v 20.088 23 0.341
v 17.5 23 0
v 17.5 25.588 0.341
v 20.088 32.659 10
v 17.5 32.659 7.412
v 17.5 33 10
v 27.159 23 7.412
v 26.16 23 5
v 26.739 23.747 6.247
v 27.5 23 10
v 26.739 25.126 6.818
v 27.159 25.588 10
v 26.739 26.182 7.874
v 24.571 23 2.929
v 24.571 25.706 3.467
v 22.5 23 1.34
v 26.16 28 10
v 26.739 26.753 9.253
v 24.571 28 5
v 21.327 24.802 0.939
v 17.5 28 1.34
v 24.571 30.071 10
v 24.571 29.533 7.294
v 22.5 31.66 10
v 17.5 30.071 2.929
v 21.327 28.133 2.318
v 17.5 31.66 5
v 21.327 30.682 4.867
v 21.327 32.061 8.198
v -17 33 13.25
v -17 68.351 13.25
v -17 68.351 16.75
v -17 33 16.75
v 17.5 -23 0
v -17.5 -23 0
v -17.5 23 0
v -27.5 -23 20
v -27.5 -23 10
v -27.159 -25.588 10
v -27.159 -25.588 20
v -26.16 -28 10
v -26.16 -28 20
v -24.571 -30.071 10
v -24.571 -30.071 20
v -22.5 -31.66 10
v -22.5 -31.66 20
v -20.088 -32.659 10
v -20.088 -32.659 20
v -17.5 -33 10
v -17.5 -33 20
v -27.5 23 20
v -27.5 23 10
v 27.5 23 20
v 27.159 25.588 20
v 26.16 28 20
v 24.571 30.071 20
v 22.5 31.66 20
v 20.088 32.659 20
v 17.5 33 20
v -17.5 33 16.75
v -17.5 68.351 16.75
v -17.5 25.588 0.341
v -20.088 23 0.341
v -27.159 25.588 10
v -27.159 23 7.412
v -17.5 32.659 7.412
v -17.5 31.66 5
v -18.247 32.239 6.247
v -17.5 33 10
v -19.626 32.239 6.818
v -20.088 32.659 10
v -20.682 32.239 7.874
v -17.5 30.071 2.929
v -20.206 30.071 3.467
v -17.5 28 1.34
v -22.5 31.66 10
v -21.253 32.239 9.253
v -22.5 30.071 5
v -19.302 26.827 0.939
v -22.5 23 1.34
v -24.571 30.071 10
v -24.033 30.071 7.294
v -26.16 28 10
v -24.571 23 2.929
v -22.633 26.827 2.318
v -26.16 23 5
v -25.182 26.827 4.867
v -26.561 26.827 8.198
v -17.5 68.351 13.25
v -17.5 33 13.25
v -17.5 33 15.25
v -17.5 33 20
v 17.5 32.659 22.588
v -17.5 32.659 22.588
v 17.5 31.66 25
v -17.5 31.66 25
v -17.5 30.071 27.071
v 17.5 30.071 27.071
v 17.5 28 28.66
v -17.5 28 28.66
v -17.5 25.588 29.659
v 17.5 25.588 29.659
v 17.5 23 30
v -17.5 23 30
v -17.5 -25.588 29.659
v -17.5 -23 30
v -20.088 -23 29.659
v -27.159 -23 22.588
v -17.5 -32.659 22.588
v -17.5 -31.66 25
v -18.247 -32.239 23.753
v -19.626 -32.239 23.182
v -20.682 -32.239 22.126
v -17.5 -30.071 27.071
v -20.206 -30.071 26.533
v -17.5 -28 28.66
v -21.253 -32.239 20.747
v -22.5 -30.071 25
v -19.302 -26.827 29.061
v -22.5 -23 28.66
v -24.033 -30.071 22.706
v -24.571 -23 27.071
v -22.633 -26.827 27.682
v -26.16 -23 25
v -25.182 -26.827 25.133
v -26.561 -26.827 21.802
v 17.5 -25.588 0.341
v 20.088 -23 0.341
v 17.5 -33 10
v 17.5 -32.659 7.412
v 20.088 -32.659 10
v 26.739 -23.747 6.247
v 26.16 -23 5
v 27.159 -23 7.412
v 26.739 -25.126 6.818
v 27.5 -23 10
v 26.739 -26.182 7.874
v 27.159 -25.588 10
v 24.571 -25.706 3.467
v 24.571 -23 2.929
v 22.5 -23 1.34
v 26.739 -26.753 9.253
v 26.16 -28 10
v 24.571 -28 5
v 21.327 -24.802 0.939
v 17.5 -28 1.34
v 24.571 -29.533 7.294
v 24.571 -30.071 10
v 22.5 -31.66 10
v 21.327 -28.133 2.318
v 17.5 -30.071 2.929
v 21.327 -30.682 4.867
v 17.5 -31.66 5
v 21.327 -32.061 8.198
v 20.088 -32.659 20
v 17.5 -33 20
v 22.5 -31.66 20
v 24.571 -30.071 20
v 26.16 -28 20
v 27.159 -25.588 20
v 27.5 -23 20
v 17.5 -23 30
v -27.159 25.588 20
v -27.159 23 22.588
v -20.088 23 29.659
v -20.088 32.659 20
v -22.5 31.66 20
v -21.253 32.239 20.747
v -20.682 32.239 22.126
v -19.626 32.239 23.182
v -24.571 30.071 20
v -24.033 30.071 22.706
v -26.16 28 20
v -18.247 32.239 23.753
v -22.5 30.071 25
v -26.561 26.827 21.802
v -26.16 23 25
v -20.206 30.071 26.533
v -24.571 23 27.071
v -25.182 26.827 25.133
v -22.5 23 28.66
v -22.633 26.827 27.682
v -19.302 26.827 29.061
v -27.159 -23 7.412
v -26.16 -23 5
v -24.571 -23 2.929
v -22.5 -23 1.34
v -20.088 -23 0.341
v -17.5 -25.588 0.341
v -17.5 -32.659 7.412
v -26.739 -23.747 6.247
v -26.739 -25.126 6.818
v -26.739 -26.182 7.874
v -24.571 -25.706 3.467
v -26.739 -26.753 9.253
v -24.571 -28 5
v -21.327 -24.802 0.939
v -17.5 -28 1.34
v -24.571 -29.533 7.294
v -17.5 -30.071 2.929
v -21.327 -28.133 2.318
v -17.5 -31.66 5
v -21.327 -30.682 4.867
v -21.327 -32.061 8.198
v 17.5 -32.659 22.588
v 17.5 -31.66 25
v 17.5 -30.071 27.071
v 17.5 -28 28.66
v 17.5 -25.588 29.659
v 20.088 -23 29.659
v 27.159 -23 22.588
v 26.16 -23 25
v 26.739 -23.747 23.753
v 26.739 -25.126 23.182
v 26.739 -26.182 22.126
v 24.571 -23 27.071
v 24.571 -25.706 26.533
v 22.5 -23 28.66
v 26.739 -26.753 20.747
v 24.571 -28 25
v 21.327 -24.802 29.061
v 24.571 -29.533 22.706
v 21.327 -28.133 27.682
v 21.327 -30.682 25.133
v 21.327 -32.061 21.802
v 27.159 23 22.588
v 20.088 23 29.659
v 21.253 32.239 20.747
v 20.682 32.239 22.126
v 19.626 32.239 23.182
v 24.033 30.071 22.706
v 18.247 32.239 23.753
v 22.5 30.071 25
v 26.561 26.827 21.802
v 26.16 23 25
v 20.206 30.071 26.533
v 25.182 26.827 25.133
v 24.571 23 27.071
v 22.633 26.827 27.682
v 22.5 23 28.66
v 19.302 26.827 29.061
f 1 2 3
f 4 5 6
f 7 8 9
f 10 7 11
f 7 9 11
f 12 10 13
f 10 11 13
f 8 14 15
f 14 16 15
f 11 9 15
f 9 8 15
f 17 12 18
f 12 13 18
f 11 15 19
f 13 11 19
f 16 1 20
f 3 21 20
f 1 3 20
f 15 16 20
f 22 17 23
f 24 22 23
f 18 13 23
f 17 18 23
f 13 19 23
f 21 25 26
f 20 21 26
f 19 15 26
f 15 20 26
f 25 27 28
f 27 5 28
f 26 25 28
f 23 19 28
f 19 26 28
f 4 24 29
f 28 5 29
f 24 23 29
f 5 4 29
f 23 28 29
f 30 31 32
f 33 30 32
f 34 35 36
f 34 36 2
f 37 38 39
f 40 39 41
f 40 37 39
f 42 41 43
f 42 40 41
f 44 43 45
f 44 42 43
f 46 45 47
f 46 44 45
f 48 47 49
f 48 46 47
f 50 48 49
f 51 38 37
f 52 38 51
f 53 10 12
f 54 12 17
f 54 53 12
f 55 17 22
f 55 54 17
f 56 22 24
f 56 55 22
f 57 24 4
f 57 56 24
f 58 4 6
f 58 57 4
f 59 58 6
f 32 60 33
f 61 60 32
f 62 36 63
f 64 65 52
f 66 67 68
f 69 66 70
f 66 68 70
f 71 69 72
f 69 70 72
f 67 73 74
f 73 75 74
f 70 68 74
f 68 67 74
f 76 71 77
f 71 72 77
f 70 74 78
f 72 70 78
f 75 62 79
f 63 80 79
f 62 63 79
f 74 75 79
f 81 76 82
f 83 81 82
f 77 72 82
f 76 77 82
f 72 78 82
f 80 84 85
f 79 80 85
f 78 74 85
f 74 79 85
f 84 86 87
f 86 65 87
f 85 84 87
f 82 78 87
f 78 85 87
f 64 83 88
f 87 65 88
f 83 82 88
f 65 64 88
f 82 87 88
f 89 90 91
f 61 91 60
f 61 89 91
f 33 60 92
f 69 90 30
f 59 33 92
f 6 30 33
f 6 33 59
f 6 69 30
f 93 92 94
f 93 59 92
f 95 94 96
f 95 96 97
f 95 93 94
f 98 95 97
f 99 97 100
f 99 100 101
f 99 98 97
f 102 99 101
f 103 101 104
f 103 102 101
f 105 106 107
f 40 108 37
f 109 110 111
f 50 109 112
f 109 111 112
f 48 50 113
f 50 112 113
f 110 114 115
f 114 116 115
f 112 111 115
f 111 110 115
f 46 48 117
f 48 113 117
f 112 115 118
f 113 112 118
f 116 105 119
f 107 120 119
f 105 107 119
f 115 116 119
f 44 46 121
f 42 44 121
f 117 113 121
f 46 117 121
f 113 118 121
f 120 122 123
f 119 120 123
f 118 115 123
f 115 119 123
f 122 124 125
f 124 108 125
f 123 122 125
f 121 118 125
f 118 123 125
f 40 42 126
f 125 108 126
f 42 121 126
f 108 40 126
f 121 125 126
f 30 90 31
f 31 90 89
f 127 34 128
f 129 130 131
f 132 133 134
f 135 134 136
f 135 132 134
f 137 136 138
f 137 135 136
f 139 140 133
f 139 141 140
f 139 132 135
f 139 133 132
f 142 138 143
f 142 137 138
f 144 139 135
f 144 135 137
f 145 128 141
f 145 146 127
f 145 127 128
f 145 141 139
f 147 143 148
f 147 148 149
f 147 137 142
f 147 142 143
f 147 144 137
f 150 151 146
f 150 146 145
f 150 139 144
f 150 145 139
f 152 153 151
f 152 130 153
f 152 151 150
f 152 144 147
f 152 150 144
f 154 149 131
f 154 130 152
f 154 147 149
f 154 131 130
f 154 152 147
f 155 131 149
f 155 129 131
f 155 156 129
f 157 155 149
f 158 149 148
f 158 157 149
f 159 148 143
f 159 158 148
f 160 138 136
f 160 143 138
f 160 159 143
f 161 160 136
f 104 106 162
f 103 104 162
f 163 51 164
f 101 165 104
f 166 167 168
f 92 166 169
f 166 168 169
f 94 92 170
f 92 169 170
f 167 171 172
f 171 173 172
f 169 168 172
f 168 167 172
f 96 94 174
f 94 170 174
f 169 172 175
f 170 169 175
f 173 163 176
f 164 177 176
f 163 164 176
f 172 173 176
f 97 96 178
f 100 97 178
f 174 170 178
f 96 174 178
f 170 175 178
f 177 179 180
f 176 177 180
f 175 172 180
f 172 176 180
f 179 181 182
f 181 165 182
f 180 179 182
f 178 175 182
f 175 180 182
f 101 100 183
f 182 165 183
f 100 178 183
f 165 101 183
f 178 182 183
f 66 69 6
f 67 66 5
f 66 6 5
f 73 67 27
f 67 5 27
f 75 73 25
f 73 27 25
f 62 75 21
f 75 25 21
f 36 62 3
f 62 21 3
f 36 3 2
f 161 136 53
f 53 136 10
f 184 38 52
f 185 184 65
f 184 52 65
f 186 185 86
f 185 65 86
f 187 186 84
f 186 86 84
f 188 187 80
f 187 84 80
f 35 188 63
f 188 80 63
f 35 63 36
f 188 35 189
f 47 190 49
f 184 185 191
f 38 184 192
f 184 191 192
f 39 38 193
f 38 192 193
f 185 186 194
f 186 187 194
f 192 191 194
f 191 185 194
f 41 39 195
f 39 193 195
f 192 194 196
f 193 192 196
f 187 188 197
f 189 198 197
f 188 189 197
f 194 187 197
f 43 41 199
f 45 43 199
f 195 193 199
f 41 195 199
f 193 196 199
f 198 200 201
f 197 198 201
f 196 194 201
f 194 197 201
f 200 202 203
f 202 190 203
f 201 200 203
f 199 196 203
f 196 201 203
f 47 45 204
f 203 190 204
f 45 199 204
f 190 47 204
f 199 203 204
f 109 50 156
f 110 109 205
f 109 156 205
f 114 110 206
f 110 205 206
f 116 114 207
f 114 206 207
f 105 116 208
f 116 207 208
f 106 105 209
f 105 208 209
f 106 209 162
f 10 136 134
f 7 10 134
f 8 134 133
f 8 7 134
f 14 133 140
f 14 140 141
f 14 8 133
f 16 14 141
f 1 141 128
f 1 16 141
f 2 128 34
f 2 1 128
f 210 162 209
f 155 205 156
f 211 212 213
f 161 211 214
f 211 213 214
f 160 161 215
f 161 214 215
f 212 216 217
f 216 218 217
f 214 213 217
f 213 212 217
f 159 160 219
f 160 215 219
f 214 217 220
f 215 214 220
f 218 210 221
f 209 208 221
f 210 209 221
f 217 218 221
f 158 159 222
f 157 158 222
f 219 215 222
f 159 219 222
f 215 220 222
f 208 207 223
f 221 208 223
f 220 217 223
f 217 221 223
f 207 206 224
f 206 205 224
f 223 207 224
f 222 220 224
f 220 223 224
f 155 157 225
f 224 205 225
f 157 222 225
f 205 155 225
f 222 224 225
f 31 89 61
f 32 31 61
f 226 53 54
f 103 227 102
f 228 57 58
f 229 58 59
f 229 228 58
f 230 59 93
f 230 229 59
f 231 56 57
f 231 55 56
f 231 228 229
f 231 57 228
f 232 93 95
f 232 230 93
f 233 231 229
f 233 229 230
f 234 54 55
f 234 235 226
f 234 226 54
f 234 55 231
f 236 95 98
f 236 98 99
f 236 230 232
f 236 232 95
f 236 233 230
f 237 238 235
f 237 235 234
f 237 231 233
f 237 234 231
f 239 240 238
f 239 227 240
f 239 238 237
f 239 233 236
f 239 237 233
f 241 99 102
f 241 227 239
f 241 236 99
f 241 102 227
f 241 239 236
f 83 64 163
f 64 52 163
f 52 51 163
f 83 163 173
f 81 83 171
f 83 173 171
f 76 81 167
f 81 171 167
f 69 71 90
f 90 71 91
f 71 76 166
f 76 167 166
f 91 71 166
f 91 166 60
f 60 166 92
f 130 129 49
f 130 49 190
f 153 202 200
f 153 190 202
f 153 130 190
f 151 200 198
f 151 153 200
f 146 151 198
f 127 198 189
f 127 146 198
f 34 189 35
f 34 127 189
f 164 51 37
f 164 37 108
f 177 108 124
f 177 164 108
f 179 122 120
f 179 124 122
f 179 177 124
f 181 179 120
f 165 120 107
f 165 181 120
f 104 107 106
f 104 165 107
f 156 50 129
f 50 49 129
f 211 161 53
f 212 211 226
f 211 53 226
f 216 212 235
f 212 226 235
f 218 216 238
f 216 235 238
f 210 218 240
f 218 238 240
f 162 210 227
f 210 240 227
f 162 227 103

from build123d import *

# Parameters (mm, degrees)
SKETCH_1_W      = 55
SKETCH_1_H      = 66
EXTRUDE_1_DEPTH = 30
FILLET_1_R      = 10
SKETCH_2_W      = 0.5
SKETCH_2_H      = 35.350562887
EXTRUDE_2_DEPTH = 0.5
SKETCH_2_4_W    = 0.5
SKETCH_2_4_H    = 35.350562887
EXTRUDE_4_DEPTH = 0.5
SKETCH_2_5_W    = 0.5
SKETCH_2_5_H    = 35.350562887
EXTRUDE_5_DEPTH = 0.5
SKETCH_2_6_W    = 0.5
SKETCH_2_6_H    = 35.350562887
EXTRUDE_6_DEPTH = 0.5
SKETCH_2_7_W    = 1.5
SKETCH_2_7_H    = 35.350562887
EXTRUDE_7_DEPTH = 0.5


with BuildPart() as part:
    # 草图1 → 凸台-拉伸1 (new body)
    with BuildSketch(Plane.XY):
        Rectangle(SKETCH_1_W, SKETCH_1_H)
    extrude(amount=EXTRUDE_1_DEPTH)

    # 圆角1
    fillet_1_edges = [part.edges().sort_by_distance(p)[0] for p in [
        (-27.5, 0, 30),
        (0, -33, 30),
        (27.5, 0, 30),
        (0, -33, 0),
        (-27.5, 0, 0),
        (0, 33, 0),
        (27.5, 0, 0),
        (27.5, -33, 15),
        (-27.5, -33, 15),
        (-27.5, 33, 15),
        (27.5, 33, 15),
        (0, 33, 30),
    ]]
    fillet(fillet_1_edges, radius=FILLET_1_R)

    # 草图2 → 凸台-拉伸2 (add)
    with BuildSketch(Plane.ZY.offset(17.5)):
        with Locations((13.5, 50.675281444)):
            Rectangle(SKETCH_2_W, SKETCH_2_H)
    extrude(amount=-EXTRUDE_2_DEPTH)

    # 草图2<4> → 凸台-拉伸4 (add)
    with BuildSketch(Plane.ZY.offset(17.5)):
        with Locations((14, 50.675281444)):
            Rectangle(SKETCH_2_4_W, SKETCH_2_4_H)
    extrude(amount=-EXTRUDE_4_DEPTH)

    # 草图2<5> → 凸台-拉伸5 (add)
    with BuildSketch(Plane.ZY.offset(17.5)):
        with Locations((15, 50.675281444)):
            Rectangle(SKETCH_2_5_W, SKETCH_2_5_H)
    extrude(amount=-EXTRUDE_5_DEPTH)

    # 草图2<6> → 凸台-拉伸6 (add)
    with BuildSketch(Plane.ZY.offset(17.5)):
        with Locations((14.5, 50.675281444)):
            Rectangle(SKETCH_2_6_W, SKETCH_2_6_H)
    extrude(amount=-EXTRUDE_6_DEPTH)

    # 草图2<7> → 凸台-拉伸7 (add)
    with BuildSketch(Plane.ZY.offset(17.5)):
        with Locations((16, 50.675281444)):
            Rectangle(SKETCH_2_7_W, SKETCH_2_7_H)
    extrude(amount=-EXTRUDE_7_DEPTH)


solid = part.part
